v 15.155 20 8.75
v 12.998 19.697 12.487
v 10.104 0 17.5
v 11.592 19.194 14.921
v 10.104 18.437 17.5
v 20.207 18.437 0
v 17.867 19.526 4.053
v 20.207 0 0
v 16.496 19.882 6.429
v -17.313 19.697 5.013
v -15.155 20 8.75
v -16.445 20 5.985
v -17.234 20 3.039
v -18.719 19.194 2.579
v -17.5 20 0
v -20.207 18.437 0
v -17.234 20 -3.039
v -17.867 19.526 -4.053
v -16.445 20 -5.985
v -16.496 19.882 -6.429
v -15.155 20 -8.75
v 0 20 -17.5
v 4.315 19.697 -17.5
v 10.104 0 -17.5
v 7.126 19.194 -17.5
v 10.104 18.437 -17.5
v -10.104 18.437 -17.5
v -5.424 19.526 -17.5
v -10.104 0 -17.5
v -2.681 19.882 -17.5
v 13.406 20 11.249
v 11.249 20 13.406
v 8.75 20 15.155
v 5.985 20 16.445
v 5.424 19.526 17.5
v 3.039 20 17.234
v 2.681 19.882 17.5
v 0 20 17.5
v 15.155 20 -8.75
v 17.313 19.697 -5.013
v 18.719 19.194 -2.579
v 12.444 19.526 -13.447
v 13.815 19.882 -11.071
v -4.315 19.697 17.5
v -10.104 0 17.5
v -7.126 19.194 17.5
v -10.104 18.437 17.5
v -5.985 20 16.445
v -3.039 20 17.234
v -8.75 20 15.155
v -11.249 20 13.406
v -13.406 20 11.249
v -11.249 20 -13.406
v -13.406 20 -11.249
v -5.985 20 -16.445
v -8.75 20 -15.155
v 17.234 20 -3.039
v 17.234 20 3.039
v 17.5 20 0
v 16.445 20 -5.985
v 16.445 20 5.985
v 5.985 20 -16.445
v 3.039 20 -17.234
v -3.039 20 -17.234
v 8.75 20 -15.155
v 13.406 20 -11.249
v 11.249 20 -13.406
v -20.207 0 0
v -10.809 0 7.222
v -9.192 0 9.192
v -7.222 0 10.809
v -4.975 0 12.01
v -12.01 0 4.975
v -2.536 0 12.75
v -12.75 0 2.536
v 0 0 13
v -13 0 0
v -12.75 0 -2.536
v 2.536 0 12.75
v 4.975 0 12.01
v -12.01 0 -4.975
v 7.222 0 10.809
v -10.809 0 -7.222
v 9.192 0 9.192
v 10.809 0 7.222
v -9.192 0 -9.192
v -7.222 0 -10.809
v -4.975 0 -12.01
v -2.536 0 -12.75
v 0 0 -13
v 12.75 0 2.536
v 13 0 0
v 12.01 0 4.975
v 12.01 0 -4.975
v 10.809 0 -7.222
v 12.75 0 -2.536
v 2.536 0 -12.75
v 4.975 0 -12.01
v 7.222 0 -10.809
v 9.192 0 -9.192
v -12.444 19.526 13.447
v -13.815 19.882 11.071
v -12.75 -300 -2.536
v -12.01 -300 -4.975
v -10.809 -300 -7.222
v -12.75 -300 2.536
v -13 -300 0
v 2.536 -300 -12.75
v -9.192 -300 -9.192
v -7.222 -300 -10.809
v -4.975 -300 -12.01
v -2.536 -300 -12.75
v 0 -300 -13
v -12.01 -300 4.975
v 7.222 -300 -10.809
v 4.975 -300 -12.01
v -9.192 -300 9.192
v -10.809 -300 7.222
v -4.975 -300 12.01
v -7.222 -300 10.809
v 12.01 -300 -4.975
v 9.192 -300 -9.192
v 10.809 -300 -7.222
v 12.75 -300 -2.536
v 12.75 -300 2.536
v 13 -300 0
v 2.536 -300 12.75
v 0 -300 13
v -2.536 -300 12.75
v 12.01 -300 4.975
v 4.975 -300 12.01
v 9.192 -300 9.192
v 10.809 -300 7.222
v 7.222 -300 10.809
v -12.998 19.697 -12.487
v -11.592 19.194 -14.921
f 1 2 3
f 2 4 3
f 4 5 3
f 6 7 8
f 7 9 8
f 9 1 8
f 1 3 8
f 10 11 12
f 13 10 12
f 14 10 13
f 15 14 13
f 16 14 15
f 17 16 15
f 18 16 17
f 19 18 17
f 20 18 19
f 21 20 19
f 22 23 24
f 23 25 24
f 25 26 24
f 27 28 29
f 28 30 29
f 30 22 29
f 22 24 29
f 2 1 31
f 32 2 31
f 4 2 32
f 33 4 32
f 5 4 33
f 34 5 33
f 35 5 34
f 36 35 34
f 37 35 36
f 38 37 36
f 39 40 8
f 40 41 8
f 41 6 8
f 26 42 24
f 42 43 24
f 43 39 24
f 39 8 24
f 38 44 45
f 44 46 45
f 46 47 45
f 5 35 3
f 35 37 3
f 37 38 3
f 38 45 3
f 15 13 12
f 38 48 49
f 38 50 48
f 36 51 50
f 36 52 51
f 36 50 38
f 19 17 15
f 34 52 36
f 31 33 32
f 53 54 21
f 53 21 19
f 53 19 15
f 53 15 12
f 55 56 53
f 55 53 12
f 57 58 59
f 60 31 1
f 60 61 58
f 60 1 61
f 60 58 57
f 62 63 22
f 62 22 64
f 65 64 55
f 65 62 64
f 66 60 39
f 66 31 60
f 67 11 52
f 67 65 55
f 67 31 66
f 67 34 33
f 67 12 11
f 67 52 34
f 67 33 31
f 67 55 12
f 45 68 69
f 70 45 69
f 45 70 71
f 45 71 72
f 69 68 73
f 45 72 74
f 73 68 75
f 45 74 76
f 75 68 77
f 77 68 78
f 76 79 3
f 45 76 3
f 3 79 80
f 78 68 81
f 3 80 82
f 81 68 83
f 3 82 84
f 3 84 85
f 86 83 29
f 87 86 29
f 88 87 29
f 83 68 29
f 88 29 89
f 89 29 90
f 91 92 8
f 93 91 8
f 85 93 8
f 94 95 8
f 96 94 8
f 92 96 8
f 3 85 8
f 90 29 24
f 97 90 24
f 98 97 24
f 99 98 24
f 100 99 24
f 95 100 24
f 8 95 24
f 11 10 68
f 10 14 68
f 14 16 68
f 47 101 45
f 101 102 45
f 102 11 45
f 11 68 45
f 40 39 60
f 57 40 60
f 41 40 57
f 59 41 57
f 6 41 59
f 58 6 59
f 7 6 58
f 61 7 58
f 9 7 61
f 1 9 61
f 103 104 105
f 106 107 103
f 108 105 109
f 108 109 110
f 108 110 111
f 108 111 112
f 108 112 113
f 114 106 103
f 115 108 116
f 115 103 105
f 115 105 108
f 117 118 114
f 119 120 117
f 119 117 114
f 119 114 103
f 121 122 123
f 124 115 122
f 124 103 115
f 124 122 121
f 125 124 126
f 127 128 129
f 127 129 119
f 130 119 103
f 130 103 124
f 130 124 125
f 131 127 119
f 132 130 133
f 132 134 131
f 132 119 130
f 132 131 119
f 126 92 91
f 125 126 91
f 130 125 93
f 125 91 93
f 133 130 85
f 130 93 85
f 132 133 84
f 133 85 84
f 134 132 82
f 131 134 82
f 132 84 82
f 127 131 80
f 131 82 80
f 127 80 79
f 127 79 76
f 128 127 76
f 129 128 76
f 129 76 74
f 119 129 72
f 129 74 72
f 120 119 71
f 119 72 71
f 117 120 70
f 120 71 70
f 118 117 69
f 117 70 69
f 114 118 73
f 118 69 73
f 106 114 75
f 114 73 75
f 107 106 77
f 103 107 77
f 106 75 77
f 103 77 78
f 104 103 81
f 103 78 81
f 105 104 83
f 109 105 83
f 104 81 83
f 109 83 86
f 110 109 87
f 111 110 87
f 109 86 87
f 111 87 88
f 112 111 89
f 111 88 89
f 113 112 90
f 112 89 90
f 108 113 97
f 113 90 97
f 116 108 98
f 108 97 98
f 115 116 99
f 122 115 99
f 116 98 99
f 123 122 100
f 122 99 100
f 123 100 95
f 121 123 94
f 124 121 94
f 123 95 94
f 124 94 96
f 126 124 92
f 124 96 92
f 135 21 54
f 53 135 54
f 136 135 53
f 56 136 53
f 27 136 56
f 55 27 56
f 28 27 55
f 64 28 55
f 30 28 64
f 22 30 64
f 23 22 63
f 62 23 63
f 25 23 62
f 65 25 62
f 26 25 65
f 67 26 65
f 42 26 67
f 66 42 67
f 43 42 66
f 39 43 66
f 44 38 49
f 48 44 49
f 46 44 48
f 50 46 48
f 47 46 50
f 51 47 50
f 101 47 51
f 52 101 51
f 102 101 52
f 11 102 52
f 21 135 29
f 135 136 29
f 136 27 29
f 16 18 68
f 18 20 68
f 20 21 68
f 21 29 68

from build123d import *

# Parameters (mm, degrees)
BOSS_EXTRUDE1_DEPTH = 20
SKETCH2_OUTSIDE_W   = 123.112
SKETCH2_OUTSIDE_H   = 117.698
SKETCH2_OUTSIDE_R   = 17.5
CUT_EXTRUDE1_DEPTH  = 20
CUT_EXTRUDE1_TAPER  = 60
SKETCH3_R           = 13
BOSS_EXTRUDE2_DEPTH = 300


with BuildPart() as part:
    # Sketch1 → Boss-Extrude1 (new body)
    with BuildSketch(Plane(origin=(0, 0, 0), x_dir=(1, 0, 0), z_dir=(0, 1, 0))):
        Polygon((-10.103629711, -17.5), (10.103629711, -17.5), (20.207259422, 0), (10.103629711, 17.5), (-10.103629711, 17.5), (-20.207259422, 0), align=None)
    extrude(amount=BOSS_EXTRUDE1_DEPTH)

    # Sketch2 outside → Cut-Extrude1 (cut)
    with BuildSketch(Plane(origin=(0, 20, 0), x_dir=(1, 0, 0), z_dir=(0, 1, 0))):
        Rectangle(SKETCH2_OUTSIDE_W, SKETCH2_OUTSIDE_H)
        Circle(SKETCH2_OUTSIDE_R, mode=Mode.SUBTRACT)
    extrude(amount=-CUT_EXTRUDE1_DEPTH, taper=CUT_EXTRUDE1_TAPER, mode=Mode.SUBTRACT)

    # Sketch3 → Boss-Extrude2 (add)
    with BuildSketch(Plane.XZ):
        Circle(SKETCH3_R)
    extrude(amount=BOSS_EXTRUDE2_DEPTH)


solid = part.part
